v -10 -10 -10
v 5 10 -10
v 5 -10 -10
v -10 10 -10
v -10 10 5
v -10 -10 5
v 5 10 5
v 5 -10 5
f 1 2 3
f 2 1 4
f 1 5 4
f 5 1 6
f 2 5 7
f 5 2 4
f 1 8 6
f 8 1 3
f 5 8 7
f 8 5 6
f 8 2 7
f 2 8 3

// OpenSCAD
// GCSC2 Test Fixture: Known-bad non-manifold geometry
// This creates an open surface (not watertight) - should FAIL mesh validation
//
// WARNING: This file is intentionally broken for testing purposes

// Create a "half cube" that is not closed - non-manifold
difference() {
    cube([20, 20, 20], center=true);
    // Cut away more than half - leaves an open surface
    translate([0, 0, 15]) cube([30, 30, 20], center=true);
    // This second cut creates a non-manifold edge condition
    translate([10, 0, 0]) cube([10, 30, 30], center=true);
}
